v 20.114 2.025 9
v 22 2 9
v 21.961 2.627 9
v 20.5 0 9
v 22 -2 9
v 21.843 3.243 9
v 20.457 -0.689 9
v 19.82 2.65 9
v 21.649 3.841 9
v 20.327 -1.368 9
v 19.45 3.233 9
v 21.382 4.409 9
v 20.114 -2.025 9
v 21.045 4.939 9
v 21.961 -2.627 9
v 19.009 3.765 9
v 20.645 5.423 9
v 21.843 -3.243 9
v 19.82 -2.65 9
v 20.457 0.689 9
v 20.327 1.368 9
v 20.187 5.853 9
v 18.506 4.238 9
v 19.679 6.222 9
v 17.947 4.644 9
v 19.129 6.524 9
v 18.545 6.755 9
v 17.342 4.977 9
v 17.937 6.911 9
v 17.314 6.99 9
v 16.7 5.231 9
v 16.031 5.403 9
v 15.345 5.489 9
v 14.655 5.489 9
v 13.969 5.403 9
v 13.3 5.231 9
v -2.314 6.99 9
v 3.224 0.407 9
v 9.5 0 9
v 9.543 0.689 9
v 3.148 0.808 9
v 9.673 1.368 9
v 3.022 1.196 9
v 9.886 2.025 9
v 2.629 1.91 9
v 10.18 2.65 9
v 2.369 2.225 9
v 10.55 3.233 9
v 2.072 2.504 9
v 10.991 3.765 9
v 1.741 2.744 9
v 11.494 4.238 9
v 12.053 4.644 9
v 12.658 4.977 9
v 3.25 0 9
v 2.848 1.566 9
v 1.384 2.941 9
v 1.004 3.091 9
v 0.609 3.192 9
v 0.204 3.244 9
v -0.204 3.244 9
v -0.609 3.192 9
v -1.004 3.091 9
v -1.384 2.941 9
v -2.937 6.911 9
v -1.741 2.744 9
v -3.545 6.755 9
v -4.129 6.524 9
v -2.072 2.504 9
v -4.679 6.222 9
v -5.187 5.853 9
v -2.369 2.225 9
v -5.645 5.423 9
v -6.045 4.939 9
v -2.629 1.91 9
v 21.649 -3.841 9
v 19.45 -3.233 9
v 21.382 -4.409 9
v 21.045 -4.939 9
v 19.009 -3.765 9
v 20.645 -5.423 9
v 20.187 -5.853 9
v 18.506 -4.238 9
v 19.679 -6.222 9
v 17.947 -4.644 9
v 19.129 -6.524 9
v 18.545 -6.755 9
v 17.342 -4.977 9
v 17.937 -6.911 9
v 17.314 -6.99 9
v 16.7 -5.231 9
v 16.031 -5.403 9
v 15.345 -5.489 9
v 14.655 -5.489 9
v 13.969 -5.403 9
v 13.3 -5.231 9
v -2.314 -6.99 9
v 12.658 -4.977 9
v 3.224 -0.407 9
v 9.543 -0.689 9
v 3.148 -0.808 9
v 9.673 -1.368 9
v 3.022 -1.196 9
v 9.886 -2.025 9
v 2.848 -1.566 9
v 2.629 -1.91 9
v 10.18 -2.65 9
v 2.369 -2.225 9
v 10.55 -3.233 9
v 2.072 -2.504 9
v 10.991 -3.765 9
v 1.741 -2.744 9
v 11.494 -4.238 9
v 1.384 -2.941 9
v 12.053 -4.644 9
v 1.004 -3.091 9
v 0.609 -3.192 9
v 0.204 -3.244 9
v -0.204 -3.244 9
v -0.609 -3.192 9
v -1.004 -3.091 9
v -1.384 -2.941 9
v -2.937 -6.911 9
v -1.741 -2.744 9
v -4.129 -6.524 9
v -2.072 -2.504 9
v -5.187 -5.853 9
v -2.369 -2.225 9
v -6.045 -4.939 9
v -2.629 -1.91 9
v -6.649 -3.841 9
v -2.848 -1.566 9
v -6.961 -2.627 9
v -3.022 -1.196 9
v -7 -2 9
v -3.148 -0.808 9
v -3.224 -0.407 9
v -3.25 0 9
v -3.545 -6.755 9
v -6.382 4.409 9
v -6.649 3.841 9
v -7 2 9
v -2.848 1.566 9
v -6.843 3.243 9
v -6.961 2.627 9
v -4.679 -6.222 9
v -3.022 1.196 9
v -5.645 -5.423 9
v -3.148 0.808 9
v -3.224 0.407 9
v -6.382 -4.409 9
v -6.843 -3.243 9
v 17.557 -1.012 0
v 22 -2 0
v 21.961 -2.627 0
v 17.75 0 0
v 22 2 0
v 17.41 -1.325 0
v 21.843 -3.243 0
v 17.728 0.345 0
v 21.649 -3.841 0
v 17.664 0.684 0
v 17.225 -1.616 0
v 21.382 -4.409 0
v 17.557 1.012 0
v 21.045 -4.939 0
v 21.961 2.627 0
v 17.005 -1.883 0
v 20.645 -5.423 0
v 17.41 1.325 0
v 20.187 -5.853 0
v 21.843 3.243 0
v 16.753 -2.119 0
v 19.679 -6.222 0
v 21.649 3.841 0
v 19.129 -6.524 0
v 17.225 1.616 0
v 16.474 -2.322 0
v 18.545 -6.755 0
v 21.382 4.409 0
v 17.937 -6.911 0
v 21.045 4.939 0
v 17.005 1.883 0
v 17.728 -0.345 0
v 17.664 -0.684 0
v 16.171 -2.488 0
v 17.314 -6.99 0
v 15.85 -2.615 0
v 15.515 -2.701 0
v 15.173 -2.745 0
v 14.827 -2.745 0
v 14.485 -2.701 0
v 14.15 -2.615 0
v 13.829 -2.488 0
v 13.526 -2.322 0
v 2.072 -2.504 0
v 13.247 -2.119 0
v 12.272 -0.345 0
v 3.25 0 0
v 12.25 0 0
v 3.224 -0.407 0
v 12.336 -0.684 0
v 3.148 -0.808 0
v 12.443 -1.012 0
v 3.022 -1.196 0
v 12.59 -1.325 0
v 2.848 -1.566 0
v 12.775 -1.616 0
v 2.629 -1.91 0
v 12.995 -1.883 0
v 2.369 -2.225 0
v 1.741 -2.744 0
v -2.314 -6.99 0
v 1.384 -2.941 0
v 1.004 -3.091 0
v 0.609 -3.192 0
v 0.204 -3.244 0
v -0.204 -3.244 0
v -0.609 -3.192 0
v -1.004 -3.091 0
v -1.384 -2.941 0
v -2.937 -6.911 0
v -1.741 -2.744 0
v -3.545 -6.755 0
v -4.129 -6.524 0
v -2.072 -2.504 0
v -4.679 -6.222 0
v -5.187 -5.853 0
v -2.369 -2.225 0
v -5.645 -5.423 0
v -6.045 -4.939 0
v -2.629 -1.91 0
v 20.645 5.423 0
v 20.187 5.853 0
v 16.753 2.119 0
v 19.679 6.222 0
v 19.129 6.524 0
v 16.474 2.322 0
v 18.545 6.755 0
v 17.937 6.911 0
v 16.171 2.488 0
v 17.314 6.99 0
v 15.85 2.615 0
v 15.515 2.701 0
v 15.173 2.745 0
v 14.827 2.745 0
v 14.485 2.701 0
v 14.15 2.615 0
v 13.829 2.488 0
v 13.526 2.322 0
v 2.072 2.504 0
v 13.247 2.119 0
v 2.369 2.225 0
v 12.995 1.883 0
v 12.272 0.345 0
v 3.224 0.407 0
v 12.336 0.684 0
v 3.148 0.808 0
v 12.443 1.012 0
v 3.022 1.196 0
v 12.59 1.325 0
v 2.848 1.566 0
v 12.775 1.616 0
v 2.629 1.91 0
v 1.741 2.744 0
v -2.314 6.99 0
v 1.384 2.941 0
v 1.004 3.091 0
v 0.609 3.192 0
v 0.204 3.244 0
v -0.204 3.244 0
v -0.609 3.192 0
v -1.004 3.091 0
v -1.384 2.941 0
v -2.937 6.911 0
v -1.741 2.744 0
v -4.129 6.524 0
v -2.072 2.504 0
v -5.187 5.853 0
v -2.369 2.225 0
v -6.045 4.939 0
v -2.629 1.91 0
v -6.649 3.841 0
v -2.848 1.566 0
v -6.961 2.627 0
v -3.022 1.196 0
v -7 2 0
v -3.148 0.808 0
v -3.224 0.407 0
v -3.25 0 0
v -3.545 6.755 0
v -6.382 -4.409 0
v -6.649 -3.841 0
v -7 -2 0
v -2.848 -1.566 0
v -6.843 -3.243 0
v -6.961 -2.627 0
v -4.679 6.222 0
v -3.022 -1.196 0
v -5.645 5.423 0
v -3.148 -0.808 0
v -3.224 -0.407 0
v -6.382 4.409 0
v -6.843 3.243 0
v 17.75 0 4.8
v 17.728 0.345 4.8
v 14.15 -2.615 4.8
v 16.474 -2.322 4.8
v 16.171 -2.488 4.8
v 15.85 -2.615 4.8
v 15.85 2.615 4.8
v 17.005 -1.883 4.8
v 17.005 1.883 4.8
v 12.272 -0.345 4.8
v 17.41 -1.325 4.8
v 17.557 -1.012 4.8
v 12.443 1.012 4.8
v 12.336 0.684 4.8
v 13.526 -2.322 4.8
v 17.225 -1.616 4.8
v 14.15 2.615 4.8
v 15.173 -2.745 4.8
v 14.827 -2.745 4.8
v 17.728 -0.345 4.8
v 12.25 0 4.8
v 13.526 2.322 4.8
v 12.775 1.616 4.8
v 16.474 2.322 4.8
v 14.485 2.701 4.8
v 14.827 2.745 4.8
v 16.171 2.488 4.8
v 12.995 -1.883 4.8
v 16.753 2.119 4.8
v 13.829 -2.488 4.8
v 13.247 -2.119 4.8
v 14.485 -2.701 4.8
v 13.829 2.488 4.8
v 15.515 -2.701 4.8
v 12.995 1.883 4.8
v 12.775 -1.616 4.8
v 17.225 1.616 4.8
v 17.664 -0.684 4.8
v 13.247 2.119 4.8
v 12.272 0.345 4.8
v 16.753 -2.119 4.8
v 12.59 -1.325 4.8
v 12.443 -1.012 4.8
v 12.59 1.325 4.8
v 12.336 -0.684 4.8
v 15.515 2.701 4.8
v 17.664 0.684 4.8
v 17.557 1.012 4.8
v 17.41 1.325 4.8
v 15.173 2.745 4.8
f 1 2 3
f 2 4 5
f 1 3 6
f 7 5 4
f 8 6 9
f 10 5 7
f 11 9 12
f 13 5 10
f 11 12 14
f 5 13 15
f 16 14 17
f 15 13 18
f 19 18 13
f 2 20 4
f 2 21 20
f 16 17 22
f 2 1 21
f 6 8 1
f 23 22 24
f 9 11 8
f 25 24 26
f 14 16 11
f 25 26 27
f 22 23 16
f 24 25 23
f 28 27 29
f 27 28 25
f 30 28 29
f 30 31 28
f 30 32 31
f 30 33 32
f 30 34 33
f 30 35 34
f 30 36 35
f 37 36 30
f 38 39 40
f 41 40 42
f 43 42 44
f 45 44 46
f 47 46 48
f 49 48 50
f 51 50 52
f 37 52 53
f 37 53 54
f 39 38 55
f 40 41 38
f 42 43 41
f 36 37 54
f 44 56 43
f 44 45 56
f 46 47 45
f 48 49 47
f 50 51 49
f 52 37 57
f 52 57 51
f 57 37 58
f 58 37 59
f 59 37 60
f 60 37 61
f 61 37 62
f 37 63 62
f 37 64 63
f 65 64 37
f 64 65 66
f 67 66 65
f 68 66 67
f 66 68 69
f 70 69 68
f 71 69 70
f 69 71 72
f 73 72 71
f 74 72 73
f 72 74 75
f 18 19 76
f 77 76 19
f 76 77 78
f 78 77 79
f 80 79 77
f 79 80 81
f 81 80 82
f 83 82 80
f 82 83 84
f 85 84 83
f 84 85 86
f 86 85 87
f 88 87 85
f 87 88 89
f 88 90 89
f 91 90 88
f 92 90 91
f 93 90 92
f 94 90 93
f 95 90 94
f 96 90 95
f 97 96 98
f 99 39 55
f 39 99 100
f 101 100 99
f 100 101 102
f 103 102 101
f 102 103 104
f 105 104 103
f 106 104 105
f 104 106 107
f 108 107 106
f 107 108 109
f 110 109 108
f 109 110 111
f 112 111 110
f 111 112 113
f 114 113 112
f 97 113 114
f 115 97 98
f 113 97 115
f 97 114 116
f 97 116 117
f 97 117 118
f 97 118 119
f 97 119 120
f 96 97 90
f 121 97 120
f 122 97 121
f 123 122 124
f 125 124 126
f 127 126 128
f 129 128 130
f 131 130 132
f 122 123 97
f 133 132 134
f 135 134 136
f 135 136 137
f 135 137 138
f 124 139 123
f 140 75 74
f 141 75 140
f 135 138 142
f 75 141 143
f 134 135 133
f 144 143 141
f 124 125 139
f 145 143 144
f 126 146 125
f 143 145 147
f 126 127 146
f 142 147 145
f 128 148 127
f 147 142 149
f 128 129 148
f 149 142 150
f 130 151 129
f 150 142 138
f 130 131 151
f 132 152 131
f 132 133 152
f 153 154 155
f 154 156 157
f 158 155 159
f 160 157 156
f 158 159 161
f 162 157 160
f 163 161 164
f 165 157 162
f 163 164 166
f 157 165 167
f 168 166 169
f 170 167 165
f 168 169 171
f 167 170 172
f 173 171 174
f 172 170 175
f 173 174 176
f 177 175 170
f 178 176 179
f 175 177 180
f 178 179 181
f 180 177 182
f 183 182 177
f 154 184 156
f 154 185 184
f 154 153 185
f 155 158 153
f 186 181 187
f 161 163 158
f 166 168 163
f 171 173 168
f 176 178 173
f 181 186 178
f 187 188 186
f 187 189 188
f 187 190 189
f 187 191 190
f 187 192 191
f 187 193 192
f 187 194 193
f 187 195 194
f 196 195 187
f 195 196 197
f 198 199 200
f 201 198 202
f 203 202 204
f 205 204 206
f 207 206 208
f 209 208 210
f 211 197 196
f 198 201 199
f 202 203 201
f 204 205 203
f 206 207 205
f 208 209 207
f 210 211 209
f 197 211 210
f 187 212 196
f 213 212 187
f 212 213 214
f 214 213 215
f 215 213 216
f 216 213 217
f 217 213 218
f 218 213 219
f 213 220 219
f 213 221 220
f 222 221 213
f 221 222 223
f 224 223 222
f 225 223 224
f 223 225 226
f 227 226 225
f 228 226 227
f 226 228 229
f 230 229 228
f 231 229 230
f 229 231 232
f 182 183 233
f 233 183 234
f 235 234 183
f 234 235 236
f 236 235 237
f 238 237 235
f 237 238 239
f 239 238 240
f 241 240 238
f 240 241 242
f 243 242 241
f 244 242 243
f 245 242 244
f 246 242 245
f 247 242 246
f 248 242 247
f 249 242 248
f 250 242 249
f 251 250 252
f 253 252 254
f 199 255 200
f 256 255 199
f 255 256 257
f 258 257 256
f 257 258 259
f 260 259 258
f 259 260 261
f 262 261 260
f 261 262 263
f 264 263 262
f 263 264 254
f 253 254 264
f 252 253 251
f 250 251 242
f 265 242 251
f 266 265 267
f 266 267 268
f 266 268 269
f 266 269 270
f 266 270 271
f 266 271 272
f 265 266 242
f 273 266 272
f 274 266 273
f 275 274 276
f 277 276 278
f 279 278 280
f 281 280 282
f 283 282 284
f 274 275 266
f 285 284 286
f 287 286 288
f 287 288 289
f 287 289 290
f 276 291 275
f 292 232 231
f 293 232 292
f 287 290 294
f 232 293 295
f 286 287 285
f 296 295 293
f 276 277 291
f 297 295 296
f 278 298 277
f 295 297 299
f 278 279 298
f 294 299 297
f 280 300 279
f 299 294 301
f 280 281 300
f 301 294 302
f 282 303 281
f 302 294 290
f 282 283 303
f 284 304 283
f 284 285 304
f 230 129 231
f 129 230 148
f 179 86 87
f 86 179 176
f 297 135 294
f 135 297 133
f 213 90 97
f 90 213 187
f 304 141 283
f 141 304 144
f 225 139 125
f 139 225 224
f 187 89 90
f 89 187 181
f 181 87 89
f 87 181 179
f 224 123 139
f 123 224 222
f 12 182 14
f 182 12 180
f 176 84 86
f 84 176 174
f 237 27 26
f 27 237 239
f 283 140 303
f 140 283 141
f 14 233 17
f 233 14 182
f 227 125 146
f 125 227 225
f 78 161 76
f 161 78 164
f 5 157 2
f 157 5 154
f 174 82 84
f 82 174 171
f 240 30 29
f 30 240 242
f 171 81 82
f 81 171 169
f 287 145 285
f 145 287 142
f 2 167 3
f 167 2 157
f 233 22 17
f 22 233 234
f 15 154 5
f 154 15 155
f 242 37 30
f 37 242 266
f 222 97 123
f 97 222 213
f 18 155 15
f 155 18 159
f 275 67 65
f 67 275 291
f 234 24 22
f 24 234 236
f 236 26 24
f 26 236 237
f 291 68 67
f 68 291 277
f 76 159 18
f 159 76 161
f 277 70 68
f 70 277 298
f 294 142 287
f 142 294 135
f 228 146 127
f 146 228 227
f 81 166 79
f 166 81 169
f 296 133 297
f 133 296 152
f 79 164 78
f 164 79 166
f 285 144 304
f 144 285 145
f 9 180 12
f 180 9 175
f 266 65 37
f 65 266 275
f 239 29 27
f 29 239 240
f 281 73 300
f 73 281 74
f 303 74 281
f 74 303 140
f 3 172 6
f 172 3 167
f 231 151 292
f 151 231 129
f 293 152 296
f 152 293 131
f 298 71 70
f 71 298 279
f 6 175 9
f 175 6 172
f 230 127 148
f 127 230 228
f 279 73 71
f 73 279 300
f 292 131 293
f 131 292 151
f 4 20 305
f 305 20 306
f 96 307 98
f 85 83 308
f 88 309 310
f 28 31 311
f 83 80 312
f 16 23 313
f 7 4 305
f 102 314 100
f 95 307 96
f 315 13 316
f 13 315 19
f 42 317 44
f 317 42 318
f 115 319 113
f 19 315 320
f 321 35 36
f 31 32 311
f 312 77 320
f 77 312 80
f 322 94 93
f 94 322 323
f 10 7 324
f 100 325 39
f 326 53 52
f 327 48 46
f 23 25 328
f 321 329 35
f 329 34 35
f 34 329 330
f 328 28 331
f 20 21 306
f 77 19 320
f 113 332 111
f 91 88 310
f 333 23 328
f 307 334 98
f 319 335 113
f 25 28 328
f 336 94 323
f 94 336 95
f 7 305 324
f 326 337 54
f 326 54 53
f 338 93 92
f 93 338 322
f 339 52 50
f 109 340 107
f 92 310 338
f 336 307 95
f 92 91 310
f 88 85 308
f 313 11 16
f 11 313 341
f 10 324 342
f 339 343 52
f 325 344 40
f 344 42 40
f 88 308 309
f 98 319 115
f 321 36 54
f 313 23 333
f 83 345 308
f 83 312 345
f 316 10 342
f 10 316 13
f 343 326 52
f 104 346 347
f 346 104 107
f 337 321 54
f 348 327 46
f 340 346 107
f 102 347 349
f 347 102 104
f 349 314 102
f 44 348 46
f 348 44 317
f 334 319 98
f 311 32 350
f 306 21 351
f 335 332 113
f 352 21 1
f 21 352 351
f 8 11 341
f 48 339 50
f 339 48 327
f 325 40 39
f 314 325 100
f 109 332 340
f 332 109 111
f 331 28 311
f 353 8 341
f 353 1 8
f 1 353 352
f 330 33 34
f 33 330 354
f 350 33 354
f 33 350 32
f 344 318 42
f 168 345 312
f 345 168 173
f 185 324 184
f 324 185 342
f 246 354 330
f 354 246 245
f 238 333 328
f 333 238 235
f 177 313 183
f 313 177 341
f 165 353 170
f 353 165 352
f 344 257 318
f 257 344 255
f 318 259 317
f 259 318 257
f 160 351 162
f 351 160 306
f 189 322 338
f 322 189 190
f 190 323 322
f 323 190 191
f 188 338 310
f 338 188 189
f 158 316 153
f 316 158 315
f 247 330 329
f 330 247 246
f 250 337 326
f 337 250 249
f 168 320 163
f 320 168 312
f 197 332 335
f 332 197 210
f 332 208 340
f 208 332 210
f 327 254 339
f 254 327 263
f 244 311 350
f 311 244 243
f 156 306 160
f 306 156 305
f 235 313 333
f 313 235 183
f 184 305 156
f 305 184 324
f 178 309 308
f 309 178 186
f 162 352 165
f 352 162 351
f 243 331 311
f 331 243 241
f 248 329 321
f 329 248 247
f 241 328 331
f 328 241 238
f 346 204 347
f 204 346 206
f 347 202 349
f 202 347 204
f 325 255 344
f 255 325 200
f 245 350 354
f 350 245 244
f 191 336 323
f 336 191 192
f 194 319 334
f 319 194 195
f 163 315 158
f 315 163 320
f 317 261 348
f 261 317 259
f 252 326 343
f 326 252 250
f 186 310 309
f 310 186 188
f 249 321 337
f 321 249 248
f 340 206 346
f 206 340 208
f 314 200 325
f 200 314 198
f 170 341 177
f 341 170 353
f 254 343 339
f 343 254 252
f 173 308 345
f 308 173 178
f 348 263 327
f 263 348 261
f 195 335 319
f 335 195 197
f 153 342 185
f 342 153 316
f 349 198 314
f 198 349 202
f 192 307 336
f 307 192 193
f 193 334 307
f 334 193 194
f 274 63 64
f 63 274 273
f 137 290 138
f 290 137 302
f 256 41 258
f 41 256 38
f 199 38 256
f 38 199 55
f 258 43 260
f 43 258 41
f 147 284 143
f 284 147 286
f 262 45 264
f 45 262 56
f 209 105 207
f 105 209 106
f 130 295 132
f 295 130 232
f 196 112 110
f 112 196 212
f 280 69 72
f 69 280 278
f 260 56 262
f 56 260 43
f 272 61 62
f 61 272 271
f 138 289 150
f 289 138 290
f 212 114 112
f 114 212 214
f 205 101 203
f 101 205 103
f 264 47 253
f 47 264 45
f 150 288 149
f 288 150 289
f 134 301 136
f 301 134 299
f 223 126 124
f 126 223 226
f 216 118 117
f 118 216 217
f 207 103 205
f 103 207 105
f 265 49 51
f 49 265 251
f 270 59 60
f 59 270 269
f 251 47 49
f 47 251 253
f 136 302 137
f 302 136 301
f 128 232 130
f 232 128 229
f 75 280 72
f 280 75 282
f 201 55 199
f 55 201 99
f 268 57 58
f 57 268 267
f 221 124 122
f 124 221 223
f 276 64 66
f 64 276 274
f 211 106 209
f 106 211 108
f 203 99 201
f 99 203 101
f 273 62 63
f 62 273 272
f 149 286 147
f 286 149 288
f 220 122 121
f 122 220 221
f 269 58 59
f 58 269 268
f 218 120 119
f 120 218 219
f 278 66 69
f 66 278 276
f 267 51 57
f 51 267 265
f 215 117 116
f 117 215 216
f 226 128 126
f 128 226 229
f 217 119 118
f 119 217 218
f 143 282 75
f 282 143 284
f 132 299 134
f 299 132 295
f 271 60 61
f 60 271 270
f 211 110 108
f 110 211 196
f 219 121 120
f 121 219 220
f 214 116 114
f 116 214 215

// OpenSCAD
$fn = 50;


difference() {
	union() {
		cylinder(h = 9, r = 7.0000000000);
		translate(v = [7.5000000000, 0.0000000000, 0]) {
			hull() {
				translate(v = [-9.5000000000, 2.0000000000, 0]) {
					cylinder(h = 9, r = 5);
				}
				translate(v = [9.5000000000, 2.0000000000, 0]) {
					cylinder(h = 9, r = 5);
				}
				translate(v = [-9.5000000000, -2.0000000000, 0]) {
					cylinder(h = 9, r = 5);
				}
				translate(v = [9.5000000000, -2.0000000000, 0]) {
					cylinder(h = 9, r = 5);
				}
			}
		}
		translate(v = [7.5000000000, 0.0000000000, 0]) {
			hull() {
				translate(v = [-9.5000000000, 2.0000000000, 0]) {
					cylinder(h = 9, r = 5);
				}
				translate(v = [9.5000000000, 2.0000000000, 0]) {
					cylinder(h = 9, r = 5);
				}
				translate(v = [-9.5000000000, -2.0000000000, 0]) {
					cylinder(h = 9, r = 5);
				}
				translate(v = [9.5000000000, -2.0000000000, 0]) {
					cylinder(h = 9, r = 5);
				}
			}
		}
	}
	union() {
		translate(v = [15.0000000000, 0.0000000000, 9]) {
			rotate(a = [0, 0, 0]) {
				difference() {
					union() {
						#translate(v = [0, 0, -9.0000000000]) {
							cylinder(h = 9, r = 2.2500000000);
						}
						#translate(v = [0, 0, -4.2000000000]) {
							cylinder(h = 4.2000000000, r1 = 2.7500000000, r2 = 5.5000000000);
						}
						#translate(v = [0, 0, -9.0000000000]) {
							cylinder(h = 9, r = 2.7500000000);
						}
						#translate(v = [0, 0, -9.0000000000]) {
							cylinder(h = 9, r = 2.2500000000);
						}
					}
					union();
				}
			}
		}
		translate(v = [15.0000000000, 0.0000000000, 9]) {
			rotate(a = [0, 0, 0]) {
				difference() {
					union() {
						#translate(v = [0, 0, -9.0000000000]) {
							cylinder(h = 9, r = 2.2500000000);
						}
						#translate(v = [0, 0, -4.2000000000]) {
							cylinder(h = 4.2000000000, r1 = 2.7500000000, r2 = 5.5000000000);
						}
						#translate(v = [0, 0, -9.0000000000]) {
							cylinder(h = 9, r = 2.7500000000);
						}
						#translate(v = [0, 0, -9.0000000000]) {
							cylinder(h = 9, r = 2.2500000000);
						}
					}
					union();
				}
			}
		}
		translate(v = [0, 0, -100]) {
			cylinder(h = 200, r = 3.2500000000);
		}
		translate(v = [0, 0, -100]) {
			cylinder(h = 200, r = 1.8000000000);
		}
	}
}
